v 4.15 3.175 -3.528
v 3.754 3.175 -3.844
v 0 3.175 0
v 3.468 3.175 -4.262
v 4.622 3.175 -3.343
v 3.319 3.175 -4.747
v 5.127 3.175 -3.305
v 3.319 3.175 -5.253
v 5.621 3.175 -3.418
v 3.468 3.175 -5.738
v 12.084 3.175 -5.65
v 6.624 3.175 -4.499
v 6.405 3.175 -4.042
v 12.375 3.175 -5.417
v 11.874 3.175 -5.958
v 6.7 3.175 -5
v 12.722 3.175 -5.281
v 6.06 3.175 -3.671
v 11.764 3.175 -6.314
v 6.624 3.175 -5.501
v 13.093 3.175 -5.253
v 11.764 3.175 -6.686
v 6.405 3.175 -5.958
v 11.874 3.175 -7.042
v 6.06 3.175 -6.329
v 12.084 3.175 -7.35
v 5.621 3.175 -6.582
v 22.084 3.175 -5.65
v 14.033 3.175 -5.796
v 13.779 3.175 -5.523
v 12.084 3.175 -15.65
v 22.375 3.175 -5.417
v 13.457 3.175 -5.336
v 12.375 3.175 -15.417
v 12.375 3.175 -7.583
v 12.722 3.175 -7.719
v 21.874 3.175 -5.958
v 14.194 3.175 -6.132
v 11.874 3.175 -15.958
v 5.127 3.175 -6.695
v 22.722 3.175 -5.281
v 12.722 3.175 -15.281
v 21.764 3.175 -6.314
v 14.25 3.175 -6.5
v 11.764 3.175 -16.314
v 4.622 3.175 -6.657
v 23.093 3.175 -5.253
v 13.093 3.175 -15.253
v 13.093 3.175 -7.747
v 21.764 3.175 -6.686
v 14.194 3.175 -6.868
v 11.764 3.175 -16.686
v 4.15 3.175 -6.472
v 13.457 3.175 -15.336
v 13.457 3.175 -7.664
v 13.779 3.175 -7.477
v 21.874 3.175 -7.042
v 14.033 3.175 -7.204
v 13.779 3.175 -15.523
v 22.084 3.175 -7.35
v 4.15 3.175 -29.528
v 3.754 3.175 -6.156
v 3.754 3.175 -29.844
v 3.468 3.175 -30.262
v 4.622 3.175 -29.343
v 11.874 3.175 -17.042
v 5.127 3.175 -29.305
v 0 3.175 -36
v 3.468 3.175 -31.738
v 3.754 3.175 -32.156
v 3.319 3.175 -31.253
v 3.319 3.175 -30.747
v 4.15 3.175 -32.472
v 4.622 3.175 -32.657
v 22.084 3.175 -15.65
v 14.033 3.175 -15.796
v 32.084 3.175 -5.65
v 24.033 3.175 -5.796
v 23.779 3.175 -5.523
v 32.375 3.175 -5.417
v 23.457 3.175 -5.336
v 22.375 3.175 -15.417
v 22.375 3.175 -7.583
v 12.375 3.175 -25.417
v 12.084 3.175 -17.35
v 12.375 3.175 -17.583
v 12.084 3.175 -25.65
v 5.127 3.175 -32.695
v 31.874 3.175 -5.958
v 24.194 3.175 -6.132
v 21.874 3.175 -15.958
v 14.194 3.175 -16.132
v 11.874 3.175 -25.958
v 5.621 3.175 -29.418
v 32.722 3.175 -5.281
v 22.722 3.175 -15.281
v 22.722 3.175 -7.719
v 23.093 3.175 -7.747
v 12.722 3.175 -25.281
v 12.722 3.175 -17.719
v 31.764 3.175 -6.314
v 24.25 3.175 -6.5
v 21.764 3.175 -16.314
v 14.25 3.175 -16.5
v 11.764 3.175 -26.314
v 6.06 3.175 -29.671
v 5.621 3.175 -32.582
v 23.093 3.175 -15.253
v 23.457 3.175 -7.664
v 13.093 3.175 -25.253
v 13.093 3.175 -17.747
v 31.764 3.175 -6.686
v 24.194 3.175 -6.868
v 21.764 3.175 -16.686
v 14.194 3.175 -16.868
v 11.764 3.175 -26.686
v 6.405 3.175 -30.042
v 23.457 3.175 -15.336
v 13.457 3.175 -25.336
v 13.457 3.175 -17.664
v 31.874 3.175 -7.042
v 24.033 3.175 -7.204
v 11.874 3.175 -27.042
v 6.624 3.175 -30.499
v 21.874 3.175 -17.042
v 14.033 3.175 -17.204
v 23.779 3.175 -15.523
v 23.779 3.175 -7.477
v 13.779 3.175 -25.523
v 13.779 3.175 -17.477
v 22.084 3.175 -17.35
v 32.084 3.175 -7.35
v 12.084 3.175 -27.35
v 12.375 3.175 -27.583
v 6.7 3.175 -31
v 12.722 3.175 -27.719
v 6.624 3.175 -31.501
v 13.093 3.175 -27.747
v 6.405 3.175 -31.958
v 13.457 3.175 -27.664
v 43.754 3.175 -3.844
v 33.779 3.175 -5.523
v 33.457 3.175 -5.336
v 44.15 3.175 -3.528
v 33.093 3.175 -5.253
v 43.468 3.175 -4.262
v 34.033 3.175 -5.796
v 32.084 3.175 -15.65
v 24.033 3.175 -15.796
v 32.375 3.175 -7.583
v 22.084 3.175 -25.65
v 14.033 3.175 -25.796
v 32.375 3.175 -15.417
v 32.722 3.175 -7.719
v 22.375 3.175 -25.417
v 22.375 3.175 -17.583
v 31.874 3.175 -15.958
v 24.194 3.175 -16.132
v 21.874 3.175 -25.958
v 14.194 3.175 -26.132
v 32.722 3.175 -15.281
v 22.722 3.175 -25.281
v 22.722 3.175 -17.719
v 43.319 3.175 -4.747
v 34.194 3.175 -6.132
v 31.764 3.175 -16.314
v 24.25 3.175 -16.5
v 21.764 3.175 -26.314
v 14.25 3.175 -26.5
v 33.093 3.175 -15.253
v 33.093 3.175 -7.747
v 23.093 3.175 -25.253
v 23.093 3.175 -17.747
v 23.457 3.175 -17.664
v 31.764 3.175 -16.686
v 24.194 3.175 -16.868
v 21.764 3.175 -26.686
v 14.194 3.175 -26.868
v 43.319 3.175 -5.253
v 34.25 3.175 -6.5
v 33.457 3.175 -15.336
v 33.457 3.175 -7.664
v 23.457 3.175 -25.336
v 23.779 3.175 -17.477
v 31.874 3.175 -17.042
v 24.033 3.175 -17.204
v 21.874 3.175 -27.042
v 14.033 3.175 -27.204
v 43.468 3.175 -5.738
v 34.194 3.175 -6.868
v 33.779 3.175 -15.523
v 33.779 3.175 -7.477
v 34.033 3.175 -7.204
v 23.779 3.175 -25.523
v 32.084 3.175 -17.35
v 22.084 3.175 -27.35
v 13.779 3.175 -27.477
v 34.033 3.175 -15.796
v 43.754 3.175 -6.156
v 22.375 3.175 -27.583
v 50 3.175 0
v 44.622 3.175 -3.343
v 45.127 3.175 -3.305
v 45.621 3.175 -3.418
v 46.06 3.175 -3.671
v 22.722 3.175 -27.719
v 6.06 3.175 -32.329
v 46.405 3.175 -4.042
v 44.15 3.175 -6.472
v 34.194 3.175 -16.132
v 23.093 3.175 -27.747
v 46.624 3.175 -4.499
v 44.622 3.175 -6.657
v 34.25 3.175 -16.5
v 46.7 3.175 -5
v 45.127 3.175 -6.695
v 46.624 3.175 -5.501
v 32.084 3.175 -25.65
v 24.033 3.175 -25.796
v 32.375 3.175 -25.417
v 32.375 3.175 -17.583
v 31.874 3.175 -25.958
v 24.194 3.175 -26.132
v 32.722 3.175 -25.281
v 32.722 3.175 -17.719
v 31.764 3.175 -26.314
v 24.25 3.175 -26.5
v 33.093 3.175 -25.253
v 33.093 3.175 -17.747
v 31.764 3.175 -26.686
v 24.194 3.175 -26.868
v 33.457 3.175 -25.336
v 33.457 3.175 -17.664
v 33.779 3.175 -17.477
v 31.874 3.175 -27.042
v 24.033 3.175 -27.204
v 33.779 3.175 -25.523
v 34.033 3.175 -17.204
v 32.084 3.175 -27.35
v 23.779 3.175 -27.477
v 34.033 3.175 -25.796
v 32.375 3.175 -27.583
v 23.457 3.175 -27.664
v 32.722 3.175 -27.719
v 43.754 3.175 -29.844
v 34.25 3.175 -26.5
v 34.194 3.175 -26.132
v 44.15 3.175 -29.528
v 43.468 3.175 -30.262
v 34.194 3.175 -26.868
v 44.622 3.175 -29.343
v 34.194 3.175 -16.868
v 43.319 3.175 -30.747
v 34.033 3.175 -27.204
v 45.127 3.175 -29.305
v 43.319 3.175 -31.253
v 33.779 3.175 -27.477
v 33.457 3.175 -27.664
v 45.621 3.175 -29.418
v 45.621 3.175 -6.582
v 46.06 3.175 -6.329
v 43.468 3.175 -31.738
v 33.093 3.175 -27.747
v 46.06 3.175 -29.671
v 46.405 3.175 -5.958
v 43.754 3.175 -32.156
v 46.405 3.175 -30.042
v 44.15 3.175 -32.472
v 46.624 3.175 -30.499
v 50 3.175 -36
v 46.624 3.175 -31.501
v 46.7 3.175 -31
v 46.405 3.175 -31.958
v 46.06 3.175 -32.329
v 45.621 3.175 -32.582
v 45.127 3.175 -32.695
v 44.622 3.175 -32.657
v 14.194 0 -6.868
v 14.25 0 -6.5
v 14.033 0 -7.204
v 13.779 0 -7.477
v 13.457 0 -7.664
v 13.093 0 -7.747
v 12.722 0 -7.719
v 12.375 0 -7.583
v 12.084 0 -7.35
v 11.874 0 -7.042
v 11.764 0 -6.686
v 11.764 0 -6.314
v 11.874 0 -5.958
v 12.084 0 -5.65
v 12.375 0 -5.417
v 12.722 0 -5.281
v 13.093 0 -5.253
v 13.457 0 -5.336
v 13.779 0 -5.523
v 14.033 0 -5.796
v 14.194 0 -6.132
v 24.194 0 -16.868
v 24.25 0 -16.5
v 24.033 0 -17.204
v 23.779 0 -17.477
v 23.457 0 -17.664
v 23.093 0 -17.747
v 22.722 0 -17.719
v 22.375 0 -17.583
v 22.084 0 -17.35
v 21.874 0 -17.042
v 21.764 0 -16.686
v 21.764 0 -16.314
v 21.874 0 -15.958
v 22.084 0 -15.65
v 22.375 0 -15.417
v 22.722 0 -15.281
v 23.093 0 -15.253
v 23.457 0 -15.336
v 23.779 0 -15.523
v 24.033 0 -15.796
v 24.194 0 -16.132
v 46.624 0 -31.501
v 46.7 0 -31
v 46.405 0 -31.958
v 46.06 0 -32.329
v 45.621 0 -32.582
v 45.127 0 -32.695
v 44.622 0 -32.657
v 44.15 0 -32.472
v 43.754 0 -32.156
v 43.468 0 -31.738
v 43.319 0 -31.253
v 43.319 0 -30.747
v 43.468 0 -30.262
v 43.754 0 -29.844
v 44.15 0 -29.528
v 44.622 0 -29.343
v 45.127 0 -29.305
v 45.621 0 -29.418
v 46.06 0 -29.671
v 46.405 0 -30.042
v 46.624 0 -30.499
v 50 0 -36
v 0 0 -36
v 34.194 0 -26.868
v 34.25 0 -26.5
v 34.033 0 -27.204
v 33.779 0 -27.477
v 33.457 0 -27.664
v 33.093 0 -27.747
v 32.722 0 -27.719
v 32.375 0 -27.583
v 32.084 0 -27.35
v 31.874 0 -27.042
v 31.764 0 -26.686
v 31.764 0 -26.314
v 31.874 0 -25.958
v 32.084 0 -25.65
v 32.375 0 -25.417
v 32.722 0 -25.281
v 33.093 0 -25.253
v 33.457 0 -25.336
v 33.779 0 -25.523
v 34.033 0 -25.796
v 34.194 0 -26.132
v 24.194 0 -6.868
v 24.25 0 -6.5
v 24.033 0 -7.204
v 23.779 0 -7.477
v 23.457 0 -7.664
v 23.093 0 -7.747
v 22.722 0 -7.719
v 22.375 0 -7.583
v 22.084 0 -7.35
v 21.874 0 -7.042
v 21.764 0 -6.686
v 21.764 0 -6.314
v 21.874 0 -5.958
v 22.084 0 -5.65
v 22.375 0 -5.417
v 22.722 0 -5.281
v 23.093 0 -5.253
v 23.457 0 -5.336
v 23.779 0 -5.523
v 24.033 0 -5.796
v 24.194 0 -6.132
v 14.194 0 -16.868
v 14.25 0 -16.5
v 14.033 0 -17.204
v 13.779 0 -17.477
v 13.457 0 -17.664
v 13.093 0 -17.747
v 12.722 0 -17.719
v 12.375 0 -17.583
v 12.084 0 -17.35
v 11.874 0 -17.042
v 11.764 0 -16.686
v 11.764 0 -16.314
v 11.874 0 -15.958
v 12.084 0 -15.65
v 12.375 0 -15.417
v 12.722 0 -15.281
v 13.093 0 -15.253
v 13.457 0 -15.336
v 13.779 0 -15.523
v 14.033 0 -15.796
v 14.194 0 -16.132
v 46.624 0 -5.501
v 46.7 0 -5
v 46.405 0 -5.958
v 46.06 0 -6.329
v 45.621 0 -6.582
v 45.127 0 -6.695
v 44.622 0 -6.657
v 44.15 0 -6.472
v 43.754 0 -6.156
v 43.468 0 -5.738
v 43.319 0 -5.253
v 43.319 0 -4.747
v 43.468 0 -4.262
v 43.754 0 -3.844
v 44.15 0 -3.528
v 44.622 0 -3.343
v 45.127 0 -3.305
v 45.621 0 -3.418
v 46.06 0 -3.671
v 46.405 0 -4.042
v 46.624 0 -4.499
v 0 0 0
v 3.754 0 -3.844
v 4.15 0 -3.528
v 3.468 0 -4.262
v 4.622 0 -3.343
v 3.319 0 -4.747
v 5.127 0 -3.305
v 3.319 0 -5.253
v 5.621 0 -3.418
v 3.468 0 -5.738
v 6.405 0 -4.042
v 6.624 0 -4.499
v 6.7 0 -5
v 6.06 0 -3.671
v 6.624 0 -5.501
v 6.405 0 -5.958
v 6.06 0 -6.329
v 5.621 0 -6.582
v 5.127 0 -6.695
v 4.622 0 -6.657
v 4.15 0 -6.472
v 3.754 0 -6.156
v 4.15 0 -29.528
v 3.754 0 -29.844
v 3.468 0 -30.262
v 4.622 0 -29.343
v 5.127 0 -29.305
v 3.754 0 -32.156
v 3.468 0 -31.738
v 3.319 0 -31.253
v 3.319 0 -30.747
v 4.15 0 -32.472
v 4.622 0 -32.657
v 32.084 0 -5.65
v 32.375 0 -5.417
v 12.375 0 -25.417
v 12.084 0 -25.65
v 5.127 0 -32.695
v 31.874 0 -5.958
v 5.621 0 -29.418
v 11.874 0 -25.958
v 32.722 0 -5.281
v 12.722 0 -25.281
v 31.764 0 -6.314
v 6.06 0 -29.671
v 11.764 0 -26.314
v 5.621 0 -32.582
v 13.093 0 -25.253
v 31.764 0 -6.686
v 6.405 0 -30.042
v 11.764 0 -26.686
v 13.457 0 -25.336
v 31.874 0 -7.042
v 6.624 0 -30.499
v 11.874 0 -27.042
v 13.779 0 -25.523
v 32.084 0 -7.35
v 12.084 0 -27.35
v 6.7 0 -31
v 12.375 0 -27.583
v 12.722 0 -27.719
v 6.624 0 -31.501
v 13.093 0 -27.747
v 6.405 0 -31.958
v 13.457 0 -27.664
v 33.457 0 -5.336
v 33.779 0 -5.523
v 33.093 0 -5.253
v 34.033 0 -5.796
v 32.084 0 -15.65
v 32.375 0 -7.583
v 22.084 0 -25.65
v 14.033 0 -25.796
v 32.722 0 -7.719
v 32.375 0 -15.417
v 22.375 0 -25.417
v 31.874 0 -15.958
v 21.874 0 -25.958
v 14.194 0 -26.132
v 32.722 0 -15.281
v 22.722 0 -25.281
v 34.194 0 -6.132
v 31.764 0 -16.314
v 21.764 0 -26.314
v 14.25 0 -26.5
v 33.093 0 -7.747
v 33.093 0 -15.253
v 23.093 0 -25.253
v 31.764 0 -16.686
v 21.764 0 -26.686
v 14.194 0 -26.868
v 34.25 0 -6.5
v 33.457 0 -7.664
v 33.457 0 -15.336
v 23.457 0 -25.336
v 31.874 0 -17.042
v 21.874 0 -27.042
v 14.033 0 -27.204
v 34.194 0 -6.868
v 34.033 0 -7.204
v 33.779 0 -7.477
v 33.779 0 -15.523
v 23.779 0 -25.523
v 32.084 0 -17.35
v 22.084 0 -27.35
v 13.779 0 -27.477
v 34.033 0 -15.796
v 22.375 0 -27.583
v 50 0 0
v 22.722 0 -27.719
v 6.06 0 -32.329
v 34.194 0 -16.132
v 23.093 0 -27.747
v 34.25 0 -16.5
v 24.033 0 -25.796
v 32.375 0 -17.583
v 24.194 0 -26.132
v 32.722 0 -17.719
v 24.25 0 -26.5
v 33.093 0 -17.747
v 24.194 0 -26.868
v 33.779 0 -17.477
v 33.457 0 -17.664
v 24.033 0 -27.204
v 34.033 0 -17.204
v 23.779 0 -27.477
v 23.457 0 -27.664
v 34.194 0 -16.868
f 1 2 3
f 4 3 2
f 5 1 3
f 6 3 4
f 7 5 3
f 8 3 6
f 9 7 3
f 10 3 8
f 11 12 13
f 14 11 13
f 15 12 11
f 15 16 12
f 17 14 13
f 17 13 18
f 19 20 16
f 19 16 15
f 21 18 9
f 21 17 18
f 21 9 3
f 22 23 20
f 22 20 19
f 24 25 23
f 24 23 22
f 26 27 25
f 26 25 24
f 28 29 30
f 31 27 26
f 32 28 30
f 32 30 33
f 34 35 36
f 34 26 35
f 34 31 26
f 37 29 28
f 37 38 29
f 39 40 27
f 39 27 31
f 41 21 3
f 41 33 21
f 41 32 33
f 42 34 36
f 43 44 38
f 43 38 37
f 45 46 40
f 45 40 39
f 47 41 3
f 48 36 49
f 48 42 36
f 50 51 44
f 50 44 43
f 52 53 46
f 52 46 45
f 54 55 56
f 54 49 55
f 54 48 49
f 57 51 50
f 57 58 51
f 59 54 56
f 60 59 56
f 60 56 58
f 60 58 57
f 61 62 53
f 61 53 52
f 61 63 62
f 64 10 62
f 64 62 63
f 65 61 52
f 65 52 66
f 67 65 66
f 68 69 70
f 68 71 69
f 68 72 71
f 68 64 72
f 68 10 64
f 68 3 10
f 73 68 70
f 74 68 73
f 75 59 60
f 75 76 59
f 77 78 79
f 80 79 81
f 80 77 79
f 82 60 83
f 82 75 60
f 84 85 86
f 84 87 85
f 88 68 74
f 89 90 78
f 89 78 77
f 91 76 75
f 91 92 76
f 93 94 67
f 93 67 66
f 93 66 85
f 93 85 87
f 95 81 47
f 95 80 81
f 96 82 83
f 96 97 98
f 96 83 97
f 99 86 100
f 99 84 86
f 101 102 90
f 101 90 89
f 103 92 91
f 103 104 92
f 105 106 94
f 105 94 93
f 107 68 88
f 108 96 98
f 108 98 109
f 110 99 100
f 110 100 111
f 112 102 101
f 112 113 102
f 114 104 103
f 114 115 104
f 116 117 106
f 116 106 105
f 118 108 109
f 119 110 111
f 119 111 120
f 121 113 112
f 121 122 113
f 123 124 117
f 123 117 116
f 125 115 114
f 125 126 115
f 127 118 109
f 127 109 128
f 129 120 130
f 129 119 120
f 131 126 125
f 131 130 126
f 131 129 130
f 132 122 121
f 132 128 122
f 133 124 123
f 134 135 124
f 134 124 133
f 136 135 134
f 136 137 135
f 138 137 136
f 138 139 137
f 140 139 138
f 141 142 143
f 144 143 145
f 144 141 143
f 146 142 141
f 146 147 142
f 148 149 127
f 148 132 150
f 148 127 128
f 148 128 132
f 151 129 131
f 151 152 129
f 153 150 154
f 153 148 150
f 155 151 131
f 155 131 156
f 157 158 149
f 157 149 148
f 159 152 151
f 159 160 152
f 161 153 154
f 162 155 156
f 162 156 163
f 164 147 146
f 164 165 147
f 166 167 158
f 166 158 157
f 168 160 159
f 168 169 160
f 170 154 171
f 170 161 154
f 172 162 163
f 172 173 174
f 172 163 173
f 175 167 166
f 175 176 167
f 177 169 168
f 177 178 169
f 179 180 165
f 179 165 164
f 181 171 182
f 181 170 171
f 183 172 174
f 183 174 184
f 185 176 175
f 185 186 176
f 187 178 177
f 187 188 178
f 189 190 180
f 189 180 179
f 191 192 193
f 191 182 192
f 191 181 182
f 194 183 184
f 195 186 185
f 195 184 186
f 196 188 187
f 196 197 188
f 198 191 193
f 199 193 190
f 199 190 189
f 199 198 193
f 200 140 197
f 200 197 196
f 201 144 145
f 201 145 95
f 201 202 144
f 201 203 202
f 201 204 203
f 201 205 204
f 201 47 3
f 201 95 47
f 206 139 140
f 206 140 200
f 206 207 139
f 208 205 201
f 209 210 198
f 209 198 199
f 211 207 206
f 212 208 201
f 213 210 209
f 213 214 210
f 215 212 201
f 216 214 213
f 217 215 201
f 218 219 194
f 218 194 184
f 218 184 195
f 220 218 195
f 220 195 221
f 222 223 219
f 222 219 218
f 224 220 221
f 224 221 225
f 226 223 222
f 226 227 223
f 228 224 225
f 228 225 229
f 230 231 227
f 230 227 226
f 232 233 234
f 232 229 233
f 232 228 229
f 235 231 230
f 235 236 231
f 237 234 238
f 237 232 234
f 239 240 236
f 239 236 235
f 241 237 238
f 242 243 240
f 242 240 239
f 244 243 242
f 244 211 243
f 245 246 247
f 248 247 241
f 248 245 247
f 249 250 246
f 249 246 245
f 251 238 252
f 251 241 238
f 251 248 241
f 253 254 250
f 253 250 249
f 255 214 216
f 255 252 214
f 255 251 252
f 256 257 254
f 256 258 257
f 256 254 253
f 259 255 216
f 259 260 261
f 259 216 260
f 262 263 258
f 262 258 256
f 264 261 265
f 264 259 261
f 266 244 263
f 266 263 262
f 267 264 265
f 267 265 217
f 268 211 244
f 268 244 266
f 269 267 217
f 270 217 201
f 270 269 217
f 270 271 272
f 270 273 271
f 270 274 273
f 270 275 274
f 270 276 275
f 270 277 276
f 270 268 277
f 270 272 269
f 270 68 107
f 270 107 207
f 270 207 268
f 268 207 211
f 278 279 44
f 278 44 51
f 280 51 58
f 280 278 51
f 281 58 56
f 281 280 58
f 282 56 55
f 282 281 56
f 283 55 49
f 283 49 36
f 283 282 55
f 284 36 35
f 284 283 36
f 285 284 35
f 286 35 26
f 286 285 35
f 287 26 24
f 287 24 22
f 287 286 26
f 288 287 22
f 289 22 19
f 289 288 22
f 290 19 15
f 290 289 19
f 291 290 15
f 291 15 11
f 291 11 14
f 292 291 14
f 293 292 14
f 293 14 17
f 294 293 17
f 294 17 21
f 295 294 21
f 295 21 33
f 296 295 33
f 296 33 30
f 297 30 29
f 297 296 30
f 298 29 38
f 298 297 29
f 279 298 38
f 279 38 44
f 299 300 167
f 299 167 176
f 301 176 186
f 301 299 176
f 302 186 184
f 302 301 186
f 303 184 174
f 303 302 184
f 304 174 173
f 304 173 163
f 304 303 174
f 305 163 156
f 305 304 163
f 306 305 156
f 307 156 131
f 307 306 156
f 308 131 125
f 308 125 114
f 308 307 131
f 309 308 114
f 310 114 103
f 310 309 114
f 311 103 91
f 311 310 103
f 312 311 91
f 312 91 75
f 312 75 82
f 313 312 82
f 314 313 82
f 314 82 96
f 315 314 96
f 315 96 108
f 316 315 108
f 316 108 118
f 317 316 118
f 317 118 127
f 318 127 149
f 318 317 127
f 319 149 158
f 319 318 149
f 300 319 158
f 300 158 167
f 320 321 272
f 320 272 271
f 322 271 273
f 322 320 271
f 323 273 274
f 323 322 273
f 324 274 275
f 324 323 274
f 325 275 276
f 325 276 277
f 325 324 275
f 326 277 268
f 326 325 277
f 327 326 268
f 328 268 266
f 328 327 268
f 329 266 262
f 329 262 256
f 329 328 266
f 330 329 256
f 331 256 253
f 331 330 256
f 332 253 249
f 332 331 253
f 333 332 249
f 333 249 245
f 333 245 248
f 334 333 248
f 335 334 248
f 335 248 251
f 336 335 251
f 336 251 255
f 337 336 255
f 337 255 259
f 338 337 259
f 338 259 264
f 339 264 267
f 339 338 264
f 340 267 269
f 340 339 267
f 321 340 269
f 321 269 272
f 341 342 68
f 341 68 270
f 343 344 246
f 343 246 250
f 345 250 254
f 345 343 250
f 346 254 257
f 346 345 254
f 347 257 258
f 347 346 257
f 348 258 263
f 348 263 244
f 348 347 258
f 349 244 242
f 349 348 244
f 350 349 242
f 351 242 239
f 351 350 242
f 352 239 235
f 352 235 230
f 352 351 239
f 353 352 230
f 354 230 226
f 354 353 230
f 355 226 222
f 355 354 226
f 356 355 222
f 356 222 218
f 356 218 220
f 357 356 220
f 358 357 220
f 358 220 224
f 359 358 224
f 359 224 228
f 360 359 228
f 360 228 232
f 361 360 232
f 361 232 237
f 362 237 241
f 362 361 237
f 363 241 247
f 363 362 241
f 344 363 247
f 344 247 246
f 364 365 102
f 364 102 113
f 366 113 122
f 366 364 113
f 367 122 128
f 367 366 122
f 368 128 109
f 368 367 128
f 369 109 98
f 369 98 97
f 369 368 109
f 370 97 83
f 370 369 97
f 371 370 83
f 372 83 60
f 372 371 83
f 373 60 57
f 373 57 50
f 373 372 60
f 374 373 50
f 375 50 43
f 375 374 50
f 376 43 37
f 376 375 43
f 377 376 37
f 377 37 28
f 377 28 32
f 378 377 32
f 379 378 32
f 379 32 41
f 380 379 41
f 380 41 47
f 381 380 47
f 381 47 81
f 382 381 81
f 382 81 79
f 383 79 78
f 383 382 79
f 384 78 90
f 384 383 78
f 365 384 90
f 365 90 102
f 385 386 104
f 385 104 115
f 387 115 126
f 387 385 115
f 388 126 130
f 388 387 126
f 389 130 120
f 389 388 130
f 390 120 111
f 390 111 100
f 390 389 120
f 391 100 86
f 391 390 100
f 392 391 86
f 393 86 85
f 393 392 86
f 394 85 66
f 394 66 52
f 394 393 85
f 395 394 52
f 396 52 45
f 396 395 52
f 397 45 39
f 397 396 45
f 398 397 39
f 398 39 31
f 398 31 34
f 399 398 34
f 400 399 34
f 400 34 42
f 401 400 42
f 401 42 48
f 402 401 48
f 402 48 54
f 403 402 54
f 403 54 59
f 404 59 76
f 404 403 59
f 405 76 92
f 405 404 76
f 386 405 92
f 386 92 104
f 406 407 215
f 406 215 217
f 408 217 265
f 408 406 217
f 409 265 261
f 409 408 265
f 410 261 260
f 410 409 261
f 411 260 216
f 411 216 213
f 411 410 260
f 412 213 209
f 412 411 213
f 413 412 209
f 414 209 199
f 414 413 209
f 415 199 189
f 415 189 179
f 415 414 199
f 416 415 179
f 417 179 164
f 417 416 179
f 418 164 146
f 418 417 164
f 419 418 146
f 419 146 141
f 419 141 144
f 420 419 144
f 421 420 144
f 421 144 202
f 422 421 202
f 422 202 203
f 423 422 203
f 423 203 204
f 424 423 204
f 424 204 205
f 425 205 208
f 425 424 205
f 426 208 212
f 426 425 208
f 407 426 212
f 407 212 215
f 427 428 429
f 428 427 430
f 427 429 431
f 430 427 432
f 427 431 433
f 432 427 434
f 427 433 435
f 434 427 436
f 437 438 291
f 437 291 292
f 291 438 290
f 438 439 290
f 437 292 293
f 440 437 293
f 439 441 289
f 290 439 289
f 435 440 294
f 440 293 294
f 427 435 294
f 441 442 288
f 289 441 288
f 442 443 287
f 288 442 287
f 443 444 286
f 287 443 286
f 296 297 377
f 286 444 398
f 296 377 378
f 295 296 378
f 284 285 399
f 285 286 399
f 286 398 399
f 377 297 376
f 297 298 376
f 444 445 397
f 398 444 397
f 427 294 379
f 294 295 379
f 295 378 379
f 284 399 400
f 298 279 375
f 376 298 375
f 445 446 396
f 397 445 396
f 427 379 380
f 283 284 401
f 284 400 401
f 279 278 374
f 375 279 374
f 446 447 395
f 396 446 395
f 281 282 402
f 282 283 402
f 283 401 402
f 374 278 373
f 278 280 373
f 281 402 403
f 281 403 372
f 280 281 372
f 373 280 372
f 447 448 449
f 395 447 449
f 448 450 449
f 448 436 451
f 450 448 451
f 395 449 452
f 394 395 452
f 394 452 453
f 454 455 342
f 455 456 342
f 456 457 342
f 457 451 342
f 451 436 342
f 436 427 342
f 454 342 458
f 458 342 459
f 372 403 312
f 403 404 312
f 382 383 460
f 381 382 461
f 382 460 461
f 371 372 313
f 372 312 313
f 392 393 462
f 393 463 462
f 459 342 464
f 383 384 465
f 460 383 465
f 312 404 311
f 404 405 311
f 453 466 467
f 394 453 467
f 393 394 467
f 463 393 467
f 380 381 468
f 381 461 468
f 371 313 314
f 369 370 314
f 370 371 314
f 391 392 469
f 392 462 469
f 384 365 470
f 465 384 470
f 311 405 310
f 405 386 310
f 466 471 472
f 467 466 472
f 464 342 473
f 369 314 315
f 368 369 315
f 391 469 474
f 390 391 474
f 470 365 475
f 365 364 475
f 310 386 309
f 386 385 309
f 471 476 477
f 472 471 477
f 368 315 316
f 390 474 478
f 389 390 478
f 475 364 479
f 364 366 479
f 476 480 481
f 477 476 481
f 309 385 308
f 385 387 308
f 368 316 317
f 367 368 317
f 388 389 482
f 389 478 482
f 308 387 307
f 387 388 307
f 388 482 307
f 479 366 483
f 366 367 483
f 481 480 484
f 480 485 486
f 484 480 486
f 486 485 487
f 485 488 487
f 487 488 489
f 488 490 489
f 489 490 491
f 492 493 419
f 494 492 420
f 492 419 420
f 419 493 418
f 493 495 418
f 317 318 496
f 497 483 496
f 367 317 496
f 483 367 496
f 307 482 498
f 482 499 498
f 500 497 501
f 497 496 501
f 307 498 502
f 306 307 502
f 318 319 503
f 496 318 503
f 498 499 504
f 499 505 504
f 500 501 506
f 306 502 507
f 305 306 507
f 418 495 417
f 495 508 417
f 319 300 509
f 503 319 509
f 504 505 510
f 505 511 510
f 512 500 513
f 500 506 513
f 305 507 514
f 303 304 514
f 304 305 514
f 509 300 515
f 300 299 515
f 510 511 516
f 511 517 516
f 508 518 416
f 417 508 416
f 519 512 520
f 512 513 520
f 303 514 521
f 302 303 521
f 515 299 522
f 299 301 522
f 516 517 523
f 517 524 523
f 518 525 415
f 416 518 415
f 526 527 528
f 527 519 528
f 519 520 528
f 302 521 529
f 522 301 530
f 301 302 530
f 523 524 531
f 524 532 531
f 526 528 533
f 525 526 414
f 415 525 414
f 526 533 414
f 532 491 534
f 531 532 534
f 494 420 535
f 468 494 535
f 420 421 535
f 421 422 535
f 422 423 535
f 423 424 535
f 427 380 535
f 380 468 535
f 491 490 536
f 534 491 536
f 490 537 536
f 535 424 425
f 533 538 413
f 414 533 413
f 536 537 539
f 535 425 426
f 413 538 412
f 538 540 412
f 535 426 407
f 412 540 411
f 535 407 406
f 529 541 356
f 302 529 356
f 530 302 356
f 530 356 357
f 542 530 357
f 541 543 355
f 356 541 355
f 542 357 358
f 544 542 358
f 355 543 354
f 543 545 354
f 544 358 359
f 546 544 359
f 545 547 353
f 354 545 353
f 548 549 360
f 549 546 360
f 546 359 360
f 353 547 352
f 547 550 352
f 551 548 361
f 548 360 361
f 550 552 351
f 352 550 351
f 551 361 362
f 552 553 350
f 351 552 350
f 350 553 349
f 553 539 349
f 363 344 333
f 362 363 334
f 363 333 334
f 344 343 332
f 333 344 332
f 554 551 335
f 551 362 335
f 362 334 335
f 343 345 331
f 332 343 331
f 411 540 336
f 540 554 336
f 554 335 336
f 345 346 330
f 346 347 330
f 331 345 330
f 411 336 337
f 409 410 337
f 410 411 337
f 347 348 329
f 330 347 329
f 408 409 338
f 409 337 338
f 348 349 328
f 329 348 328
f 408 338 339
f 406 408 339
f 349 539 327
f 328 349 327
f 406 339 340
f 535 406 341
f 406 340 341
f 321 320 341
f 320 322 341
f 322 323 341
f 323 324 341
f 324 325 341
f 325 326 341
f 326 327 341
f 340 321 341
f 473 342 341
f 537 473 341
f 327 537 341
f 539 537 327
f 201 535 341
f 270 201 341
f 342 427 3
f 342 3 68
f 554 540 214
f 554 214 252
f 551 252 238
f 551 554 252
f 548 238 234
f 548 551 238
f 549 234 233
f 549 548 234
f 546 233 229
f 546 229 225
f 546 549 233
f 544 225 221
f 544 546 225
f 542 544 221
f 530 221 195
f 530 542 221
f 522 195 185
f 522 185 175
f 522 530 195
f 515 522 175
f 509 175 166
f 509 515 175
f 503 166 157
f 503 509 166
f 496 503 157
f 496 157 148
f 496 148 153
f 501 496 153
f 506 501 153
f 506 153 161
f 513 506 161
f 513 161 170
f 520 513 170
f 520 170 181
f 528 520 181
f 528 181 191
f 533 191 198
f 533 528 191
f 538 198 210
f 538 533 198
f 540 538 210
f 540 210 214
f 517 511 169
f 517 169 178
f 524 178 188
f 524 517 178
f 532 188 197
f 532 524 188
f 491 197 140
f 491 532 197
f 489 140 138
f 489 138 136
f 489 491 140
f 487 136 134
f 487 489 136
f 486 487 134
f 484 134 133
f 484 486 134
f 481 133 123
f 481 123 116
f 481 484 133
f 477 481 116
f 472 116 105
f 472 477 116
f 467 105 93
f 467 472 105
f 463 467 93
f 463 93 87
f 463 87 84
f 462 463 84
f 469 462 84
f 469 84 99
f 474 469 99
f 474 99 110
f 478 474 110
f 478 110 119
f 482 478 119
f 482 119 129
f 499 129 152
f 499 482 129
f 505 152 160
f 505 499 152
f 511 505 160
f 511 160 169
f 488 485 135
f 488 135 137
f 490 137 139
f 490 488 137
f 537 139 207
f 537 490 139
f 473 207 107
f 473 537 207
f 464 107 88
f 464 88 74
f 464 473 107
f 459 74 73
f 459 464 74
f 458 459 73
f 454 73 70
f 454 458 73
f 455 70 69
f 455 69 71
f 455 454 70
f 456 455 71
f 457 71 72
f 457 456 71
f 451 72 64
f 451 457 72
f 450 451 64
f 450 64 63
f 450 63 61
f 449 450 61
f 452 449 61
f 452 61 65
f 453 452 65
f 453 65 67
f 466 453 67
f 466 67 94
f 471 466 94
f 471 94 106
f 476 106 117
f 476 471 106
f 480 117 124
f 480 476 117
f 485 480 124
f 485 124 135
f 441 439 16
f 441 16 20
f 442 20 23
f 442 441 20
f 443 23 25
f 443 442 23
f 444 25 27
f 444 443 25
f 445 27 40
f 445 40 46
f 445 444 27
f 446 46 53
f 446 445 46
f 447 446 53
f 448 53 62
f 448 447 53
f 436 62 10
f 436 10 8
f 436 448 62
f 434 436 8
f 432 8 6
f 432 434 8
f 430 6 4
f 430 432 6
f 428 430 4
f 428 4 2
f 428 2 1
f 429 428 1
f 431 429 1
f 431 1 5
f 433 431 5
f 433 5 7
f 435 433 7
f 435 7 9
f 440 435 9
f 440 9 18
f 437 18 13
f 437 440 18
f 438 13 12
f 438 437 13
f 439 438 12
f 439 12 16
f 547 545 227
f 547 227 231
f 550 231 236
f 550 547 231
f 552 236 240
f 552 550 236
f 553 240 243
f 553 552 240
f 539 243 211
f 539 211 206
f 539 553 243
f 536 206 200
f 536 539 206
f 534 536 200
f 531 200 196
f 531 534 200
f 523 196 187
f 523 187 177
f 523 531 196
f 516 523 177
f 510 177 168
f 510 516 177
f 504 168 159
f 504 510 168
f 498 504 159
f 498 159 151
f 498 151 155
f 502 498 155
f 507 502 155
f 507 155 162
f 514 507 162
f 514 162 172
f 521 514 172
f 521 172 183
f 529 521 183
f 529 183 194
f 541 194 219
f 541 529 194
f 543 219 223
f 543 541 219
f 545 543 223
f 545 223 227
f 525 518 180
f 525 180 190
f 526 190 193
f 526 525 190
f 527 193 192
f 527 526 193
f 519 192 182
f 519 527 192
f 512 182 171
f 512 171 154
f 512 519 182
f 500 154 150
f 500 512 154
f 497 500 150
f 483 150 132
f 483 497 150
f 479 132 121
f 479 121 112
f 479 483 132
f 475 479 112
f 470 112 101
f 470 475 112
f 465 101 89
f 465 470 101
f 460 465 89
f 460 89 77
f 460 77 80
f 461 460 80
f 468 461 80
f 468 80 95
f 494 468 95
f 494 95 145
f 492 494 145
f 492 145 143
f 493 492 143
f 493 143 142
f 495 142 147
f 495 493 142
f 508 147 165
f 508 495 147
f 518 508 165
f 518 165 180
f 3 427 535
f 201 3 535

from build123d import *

# Parameters (mm, degrees)
SKETCH1_W           = 50
SKETCH1_H           = 36
SKETCH1_R           = 1.25
SKETCH1_R_2         = 1.7
BOSS_EXTRUDE1_DEPTH = 3.175


with BuildPart() as part:
    # Sketch1 → Boss-Extrude1 (new body)
    with BuildSketch(Plane(origin=(0, 0, 0), x_dir=(1, 0, 0), z_dir=(0, 1, 0))):
        with Locations((25, 18)):
            Rectangle(SKETCH1_W, SKETCH1_H)
        with Locations((13, 6.5)):
            Circle(SKETCH1_R, mode=Mode.SUBTRACT)
        with Locations((5, 5)):
            Circle(SKETCH1_R_2, mode=Mode.SUBTRACT)
        with Locations((5, 31)):
            Circle(SKETCH1_R_2, mode=Mode.SUBTRACT)
        with Locations((45, 31)):
            Circle(SKETCH1_R_2, mode=Mode.SUBTRACT)
        with Locations((45, 5)):
            Circle(SKETCH1_R_2, mode=Mode.SUBTRACT)
        with Locations((23, 6.5)):
            Circle(SKETCH1_R, mode=Mode.SUBTRACT)
        with Locations((33, 6.5)):
            Circle(SKETCH1_R, mode=Mode.SUBTRACT)
        with Locations((23, 16.5)):
            Circle(SKETCH1_R, mode=Mode.SUBTRACT)
        with Locations((33, 16.5)):
            Circle(SKETCH1_R, mode=Mode.SUBTRACT)
        with Locations((23, 26.5)):
            Circle(SKETCH1_R, mode=Mode.SUBTRACT)
        with Locations((33, 26.5)):
            Circle(SKETCH1_R, mode=Mode.SUBTRACT)
        with Locations((13, 16.5)):
            Circle(SKETCH1_R, mode=Mode.SUBTRACT)
        with Locations((13, 26.5)):
            Circle(SKETCH1_R, mode=Mode.SUBTRACT)
    extrude(amount=BOSS_EXTRUDE1_DEPTH)


solid = part.part
